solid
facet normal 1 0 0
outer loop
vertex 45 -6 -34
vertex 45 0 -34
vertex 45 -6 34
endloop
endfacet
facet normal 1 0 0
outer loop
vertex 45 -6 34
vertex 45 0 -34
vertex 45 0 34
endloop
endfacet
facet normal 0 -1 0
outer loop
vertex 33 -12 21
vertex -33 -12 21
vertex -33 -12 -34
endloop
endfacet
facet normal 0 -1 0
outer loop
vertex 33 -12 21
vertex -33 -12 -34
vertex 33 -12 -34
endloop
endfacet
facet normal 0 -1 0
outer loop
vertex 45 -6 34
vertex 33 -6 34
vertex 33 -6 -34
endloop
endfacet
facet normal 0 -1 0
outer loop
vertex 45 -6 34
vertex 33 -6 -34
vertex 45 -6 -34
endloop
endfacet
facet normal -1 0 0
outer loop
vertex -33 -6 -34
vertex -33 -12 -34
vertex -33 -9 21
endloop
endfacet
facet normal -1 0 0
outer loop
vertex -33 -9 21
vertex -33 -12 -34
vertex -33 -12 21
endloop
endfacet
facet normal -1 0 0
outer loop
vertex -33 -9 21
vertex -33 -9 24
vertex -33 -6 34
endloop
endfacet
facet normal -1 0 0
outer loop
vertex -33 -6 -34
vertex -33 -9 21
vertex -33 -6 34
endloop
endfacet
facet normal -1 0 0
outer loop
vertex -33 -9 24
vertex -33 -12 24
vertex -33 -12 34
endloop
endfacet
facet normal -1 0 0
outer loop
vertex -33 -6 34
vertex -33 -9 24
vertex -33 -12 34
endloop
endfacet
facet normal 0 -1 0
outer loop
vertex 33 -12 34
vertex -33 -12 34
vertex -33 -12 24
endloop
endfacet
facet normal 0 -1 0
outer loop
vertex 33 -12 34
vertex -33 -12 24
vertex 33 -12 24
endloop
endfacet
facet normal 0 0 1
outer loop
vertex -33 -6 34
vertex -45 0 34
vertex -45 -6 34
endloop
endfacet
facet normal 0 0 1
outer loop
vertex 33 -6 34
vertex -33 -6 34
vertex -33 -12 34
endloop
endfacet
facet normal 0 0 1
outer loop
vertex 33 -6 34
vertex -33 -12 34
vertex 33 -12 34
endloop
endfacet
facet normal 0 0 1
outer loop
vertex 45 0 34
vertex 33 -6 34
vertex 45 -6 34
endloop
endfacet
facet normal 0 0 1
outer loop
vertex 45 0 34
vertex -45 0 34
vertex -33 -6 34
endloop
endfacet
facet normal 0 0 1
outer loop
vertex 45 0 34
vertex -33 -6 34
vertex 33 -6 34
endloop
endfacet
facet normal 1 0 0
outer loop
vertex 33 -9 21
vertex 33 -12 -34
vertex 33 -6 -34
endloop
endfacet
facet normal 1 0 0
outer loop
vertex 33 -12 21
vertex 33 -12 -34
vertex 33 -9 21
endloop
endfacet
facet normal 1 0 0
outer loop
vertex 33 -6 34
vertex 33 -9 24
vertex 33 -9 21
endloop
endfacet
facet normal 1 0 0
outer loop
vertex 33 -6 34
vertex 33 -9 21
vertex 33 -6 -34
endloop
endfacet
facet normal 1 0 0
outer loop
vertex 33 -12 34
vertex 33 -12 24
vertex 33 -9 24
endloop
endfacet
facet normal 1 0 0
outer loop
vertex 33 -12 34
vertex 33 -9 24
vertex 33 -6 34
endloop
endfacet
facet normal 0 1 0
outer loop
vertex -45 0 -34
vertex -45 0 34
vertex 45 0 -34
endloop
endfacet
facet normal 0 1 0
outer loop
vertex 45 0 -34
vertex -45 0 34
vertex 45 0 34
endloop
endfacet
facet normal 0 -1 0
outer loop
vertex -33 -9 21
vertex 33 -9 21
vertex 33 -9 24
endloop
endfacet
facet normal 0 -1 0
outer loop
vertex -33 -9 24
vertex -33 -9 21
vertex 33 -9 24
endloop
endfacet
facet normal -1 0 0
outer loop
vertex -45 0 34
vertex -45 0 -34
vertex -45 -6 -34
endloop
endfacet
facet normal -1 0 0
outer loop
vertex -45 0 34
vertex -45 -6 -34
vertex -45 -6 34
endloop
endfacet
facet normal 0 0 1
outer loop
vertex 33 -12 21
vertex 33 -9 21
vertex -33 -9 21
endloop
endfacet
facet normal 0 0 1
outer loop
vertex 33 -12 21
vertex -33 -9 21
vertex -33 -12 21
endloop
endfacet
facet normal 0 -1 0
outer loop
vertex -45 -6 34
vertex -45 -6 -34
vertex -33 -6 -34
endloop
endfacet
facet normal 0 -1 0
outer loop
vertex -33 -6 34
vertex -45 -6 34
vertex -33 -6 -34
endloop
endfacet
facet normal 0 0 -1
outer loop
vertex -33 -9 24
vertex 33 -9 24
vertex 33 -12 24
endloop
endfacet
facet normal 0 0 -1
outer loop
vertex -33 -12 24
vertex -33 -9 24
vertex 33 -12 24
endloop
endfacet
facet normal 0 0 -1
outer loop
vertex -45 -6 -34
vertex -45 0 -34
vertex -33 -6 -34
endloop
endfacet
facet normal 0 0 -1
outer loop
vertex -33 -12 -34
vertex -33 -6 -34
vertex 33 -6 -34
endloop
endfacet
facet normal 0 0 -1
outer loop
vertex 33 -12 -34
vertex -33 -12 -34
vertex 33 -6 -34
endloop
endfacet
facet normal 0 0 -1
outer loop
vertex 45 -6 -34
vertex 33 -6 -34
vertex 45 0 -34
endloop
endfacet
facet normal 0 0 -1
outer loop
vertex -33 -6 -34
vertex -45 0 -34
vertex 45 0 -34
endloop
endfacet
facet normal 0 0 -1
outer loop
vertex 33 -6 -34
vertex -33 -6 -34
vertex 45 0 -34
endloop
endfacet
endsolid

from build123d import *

# Parameters (mm, degrees)
F0_W      = 40
F0_H      = 68
F1_DEPTH  = 12
F2_W      = 5
F2_H      = 3
F3_DEPTH  = 59
F5_W      = 90
F5_H      = 68
F6_DEPTH  = 12
F7_W      = 3
F7_H      = 3
F8_DEPTH  = 200
F9_W      = 12
F9_H      = 68.2744067311
F9_H_2    = 68.7110256553
F10_DEPTH = 6


with BuildPart() as f1:
    # F0 (on Front) → F1 (new body)
    with BuildSketch(Plane.XZ):
        Rectangle(F0_W, F0_H)
    extrude(amount=F1_DEPTH)

    # F2 (on face) → F3 (cut)
    with BuildSketch(Plane.YZ.offset(20)):
        with Locations((-9.5, 22.5)):
            Rectangle(F2_W, F2_H)
    extrude(amount=-F3_DEPTH, mode=Mode.SUBTRACT)


with BuildPart() as f6:
    # F5 (on Front) → F6 (new body)
    with BuildSketch(Plane.XZ):
        Rectangle(F5_W, F5_H)
    extrude(amount=F6_DEPTH)

    # F7 (on face) → F8 (cut)
    with BuildSketch(Plane(origin=(-45, 0, 0), x_dir=(0, -1, 0), z_dir=(-1, 0, 0))):
        with Locations((10.5, 22.5)):
            Rectangle(F7_W, F7_H)
    extrude(amount=-F8_DEPTH, mode=Mode.SUBTRACT)

    # F9 (on face) → F10 (cut)
    with BuildSketch(Plane.XZ.offset(12)):
        with Locations((-39, 0.1372033656)):
            Rectangle(F9_W, F9_H)
        with Locations((39, 0.3555128276)):
            Rectangle(F9_W, F9_H_2)
    extrude(amount=-F10_DEPTH, mode=Mode.SUBTRACT)


solid = f6.part
